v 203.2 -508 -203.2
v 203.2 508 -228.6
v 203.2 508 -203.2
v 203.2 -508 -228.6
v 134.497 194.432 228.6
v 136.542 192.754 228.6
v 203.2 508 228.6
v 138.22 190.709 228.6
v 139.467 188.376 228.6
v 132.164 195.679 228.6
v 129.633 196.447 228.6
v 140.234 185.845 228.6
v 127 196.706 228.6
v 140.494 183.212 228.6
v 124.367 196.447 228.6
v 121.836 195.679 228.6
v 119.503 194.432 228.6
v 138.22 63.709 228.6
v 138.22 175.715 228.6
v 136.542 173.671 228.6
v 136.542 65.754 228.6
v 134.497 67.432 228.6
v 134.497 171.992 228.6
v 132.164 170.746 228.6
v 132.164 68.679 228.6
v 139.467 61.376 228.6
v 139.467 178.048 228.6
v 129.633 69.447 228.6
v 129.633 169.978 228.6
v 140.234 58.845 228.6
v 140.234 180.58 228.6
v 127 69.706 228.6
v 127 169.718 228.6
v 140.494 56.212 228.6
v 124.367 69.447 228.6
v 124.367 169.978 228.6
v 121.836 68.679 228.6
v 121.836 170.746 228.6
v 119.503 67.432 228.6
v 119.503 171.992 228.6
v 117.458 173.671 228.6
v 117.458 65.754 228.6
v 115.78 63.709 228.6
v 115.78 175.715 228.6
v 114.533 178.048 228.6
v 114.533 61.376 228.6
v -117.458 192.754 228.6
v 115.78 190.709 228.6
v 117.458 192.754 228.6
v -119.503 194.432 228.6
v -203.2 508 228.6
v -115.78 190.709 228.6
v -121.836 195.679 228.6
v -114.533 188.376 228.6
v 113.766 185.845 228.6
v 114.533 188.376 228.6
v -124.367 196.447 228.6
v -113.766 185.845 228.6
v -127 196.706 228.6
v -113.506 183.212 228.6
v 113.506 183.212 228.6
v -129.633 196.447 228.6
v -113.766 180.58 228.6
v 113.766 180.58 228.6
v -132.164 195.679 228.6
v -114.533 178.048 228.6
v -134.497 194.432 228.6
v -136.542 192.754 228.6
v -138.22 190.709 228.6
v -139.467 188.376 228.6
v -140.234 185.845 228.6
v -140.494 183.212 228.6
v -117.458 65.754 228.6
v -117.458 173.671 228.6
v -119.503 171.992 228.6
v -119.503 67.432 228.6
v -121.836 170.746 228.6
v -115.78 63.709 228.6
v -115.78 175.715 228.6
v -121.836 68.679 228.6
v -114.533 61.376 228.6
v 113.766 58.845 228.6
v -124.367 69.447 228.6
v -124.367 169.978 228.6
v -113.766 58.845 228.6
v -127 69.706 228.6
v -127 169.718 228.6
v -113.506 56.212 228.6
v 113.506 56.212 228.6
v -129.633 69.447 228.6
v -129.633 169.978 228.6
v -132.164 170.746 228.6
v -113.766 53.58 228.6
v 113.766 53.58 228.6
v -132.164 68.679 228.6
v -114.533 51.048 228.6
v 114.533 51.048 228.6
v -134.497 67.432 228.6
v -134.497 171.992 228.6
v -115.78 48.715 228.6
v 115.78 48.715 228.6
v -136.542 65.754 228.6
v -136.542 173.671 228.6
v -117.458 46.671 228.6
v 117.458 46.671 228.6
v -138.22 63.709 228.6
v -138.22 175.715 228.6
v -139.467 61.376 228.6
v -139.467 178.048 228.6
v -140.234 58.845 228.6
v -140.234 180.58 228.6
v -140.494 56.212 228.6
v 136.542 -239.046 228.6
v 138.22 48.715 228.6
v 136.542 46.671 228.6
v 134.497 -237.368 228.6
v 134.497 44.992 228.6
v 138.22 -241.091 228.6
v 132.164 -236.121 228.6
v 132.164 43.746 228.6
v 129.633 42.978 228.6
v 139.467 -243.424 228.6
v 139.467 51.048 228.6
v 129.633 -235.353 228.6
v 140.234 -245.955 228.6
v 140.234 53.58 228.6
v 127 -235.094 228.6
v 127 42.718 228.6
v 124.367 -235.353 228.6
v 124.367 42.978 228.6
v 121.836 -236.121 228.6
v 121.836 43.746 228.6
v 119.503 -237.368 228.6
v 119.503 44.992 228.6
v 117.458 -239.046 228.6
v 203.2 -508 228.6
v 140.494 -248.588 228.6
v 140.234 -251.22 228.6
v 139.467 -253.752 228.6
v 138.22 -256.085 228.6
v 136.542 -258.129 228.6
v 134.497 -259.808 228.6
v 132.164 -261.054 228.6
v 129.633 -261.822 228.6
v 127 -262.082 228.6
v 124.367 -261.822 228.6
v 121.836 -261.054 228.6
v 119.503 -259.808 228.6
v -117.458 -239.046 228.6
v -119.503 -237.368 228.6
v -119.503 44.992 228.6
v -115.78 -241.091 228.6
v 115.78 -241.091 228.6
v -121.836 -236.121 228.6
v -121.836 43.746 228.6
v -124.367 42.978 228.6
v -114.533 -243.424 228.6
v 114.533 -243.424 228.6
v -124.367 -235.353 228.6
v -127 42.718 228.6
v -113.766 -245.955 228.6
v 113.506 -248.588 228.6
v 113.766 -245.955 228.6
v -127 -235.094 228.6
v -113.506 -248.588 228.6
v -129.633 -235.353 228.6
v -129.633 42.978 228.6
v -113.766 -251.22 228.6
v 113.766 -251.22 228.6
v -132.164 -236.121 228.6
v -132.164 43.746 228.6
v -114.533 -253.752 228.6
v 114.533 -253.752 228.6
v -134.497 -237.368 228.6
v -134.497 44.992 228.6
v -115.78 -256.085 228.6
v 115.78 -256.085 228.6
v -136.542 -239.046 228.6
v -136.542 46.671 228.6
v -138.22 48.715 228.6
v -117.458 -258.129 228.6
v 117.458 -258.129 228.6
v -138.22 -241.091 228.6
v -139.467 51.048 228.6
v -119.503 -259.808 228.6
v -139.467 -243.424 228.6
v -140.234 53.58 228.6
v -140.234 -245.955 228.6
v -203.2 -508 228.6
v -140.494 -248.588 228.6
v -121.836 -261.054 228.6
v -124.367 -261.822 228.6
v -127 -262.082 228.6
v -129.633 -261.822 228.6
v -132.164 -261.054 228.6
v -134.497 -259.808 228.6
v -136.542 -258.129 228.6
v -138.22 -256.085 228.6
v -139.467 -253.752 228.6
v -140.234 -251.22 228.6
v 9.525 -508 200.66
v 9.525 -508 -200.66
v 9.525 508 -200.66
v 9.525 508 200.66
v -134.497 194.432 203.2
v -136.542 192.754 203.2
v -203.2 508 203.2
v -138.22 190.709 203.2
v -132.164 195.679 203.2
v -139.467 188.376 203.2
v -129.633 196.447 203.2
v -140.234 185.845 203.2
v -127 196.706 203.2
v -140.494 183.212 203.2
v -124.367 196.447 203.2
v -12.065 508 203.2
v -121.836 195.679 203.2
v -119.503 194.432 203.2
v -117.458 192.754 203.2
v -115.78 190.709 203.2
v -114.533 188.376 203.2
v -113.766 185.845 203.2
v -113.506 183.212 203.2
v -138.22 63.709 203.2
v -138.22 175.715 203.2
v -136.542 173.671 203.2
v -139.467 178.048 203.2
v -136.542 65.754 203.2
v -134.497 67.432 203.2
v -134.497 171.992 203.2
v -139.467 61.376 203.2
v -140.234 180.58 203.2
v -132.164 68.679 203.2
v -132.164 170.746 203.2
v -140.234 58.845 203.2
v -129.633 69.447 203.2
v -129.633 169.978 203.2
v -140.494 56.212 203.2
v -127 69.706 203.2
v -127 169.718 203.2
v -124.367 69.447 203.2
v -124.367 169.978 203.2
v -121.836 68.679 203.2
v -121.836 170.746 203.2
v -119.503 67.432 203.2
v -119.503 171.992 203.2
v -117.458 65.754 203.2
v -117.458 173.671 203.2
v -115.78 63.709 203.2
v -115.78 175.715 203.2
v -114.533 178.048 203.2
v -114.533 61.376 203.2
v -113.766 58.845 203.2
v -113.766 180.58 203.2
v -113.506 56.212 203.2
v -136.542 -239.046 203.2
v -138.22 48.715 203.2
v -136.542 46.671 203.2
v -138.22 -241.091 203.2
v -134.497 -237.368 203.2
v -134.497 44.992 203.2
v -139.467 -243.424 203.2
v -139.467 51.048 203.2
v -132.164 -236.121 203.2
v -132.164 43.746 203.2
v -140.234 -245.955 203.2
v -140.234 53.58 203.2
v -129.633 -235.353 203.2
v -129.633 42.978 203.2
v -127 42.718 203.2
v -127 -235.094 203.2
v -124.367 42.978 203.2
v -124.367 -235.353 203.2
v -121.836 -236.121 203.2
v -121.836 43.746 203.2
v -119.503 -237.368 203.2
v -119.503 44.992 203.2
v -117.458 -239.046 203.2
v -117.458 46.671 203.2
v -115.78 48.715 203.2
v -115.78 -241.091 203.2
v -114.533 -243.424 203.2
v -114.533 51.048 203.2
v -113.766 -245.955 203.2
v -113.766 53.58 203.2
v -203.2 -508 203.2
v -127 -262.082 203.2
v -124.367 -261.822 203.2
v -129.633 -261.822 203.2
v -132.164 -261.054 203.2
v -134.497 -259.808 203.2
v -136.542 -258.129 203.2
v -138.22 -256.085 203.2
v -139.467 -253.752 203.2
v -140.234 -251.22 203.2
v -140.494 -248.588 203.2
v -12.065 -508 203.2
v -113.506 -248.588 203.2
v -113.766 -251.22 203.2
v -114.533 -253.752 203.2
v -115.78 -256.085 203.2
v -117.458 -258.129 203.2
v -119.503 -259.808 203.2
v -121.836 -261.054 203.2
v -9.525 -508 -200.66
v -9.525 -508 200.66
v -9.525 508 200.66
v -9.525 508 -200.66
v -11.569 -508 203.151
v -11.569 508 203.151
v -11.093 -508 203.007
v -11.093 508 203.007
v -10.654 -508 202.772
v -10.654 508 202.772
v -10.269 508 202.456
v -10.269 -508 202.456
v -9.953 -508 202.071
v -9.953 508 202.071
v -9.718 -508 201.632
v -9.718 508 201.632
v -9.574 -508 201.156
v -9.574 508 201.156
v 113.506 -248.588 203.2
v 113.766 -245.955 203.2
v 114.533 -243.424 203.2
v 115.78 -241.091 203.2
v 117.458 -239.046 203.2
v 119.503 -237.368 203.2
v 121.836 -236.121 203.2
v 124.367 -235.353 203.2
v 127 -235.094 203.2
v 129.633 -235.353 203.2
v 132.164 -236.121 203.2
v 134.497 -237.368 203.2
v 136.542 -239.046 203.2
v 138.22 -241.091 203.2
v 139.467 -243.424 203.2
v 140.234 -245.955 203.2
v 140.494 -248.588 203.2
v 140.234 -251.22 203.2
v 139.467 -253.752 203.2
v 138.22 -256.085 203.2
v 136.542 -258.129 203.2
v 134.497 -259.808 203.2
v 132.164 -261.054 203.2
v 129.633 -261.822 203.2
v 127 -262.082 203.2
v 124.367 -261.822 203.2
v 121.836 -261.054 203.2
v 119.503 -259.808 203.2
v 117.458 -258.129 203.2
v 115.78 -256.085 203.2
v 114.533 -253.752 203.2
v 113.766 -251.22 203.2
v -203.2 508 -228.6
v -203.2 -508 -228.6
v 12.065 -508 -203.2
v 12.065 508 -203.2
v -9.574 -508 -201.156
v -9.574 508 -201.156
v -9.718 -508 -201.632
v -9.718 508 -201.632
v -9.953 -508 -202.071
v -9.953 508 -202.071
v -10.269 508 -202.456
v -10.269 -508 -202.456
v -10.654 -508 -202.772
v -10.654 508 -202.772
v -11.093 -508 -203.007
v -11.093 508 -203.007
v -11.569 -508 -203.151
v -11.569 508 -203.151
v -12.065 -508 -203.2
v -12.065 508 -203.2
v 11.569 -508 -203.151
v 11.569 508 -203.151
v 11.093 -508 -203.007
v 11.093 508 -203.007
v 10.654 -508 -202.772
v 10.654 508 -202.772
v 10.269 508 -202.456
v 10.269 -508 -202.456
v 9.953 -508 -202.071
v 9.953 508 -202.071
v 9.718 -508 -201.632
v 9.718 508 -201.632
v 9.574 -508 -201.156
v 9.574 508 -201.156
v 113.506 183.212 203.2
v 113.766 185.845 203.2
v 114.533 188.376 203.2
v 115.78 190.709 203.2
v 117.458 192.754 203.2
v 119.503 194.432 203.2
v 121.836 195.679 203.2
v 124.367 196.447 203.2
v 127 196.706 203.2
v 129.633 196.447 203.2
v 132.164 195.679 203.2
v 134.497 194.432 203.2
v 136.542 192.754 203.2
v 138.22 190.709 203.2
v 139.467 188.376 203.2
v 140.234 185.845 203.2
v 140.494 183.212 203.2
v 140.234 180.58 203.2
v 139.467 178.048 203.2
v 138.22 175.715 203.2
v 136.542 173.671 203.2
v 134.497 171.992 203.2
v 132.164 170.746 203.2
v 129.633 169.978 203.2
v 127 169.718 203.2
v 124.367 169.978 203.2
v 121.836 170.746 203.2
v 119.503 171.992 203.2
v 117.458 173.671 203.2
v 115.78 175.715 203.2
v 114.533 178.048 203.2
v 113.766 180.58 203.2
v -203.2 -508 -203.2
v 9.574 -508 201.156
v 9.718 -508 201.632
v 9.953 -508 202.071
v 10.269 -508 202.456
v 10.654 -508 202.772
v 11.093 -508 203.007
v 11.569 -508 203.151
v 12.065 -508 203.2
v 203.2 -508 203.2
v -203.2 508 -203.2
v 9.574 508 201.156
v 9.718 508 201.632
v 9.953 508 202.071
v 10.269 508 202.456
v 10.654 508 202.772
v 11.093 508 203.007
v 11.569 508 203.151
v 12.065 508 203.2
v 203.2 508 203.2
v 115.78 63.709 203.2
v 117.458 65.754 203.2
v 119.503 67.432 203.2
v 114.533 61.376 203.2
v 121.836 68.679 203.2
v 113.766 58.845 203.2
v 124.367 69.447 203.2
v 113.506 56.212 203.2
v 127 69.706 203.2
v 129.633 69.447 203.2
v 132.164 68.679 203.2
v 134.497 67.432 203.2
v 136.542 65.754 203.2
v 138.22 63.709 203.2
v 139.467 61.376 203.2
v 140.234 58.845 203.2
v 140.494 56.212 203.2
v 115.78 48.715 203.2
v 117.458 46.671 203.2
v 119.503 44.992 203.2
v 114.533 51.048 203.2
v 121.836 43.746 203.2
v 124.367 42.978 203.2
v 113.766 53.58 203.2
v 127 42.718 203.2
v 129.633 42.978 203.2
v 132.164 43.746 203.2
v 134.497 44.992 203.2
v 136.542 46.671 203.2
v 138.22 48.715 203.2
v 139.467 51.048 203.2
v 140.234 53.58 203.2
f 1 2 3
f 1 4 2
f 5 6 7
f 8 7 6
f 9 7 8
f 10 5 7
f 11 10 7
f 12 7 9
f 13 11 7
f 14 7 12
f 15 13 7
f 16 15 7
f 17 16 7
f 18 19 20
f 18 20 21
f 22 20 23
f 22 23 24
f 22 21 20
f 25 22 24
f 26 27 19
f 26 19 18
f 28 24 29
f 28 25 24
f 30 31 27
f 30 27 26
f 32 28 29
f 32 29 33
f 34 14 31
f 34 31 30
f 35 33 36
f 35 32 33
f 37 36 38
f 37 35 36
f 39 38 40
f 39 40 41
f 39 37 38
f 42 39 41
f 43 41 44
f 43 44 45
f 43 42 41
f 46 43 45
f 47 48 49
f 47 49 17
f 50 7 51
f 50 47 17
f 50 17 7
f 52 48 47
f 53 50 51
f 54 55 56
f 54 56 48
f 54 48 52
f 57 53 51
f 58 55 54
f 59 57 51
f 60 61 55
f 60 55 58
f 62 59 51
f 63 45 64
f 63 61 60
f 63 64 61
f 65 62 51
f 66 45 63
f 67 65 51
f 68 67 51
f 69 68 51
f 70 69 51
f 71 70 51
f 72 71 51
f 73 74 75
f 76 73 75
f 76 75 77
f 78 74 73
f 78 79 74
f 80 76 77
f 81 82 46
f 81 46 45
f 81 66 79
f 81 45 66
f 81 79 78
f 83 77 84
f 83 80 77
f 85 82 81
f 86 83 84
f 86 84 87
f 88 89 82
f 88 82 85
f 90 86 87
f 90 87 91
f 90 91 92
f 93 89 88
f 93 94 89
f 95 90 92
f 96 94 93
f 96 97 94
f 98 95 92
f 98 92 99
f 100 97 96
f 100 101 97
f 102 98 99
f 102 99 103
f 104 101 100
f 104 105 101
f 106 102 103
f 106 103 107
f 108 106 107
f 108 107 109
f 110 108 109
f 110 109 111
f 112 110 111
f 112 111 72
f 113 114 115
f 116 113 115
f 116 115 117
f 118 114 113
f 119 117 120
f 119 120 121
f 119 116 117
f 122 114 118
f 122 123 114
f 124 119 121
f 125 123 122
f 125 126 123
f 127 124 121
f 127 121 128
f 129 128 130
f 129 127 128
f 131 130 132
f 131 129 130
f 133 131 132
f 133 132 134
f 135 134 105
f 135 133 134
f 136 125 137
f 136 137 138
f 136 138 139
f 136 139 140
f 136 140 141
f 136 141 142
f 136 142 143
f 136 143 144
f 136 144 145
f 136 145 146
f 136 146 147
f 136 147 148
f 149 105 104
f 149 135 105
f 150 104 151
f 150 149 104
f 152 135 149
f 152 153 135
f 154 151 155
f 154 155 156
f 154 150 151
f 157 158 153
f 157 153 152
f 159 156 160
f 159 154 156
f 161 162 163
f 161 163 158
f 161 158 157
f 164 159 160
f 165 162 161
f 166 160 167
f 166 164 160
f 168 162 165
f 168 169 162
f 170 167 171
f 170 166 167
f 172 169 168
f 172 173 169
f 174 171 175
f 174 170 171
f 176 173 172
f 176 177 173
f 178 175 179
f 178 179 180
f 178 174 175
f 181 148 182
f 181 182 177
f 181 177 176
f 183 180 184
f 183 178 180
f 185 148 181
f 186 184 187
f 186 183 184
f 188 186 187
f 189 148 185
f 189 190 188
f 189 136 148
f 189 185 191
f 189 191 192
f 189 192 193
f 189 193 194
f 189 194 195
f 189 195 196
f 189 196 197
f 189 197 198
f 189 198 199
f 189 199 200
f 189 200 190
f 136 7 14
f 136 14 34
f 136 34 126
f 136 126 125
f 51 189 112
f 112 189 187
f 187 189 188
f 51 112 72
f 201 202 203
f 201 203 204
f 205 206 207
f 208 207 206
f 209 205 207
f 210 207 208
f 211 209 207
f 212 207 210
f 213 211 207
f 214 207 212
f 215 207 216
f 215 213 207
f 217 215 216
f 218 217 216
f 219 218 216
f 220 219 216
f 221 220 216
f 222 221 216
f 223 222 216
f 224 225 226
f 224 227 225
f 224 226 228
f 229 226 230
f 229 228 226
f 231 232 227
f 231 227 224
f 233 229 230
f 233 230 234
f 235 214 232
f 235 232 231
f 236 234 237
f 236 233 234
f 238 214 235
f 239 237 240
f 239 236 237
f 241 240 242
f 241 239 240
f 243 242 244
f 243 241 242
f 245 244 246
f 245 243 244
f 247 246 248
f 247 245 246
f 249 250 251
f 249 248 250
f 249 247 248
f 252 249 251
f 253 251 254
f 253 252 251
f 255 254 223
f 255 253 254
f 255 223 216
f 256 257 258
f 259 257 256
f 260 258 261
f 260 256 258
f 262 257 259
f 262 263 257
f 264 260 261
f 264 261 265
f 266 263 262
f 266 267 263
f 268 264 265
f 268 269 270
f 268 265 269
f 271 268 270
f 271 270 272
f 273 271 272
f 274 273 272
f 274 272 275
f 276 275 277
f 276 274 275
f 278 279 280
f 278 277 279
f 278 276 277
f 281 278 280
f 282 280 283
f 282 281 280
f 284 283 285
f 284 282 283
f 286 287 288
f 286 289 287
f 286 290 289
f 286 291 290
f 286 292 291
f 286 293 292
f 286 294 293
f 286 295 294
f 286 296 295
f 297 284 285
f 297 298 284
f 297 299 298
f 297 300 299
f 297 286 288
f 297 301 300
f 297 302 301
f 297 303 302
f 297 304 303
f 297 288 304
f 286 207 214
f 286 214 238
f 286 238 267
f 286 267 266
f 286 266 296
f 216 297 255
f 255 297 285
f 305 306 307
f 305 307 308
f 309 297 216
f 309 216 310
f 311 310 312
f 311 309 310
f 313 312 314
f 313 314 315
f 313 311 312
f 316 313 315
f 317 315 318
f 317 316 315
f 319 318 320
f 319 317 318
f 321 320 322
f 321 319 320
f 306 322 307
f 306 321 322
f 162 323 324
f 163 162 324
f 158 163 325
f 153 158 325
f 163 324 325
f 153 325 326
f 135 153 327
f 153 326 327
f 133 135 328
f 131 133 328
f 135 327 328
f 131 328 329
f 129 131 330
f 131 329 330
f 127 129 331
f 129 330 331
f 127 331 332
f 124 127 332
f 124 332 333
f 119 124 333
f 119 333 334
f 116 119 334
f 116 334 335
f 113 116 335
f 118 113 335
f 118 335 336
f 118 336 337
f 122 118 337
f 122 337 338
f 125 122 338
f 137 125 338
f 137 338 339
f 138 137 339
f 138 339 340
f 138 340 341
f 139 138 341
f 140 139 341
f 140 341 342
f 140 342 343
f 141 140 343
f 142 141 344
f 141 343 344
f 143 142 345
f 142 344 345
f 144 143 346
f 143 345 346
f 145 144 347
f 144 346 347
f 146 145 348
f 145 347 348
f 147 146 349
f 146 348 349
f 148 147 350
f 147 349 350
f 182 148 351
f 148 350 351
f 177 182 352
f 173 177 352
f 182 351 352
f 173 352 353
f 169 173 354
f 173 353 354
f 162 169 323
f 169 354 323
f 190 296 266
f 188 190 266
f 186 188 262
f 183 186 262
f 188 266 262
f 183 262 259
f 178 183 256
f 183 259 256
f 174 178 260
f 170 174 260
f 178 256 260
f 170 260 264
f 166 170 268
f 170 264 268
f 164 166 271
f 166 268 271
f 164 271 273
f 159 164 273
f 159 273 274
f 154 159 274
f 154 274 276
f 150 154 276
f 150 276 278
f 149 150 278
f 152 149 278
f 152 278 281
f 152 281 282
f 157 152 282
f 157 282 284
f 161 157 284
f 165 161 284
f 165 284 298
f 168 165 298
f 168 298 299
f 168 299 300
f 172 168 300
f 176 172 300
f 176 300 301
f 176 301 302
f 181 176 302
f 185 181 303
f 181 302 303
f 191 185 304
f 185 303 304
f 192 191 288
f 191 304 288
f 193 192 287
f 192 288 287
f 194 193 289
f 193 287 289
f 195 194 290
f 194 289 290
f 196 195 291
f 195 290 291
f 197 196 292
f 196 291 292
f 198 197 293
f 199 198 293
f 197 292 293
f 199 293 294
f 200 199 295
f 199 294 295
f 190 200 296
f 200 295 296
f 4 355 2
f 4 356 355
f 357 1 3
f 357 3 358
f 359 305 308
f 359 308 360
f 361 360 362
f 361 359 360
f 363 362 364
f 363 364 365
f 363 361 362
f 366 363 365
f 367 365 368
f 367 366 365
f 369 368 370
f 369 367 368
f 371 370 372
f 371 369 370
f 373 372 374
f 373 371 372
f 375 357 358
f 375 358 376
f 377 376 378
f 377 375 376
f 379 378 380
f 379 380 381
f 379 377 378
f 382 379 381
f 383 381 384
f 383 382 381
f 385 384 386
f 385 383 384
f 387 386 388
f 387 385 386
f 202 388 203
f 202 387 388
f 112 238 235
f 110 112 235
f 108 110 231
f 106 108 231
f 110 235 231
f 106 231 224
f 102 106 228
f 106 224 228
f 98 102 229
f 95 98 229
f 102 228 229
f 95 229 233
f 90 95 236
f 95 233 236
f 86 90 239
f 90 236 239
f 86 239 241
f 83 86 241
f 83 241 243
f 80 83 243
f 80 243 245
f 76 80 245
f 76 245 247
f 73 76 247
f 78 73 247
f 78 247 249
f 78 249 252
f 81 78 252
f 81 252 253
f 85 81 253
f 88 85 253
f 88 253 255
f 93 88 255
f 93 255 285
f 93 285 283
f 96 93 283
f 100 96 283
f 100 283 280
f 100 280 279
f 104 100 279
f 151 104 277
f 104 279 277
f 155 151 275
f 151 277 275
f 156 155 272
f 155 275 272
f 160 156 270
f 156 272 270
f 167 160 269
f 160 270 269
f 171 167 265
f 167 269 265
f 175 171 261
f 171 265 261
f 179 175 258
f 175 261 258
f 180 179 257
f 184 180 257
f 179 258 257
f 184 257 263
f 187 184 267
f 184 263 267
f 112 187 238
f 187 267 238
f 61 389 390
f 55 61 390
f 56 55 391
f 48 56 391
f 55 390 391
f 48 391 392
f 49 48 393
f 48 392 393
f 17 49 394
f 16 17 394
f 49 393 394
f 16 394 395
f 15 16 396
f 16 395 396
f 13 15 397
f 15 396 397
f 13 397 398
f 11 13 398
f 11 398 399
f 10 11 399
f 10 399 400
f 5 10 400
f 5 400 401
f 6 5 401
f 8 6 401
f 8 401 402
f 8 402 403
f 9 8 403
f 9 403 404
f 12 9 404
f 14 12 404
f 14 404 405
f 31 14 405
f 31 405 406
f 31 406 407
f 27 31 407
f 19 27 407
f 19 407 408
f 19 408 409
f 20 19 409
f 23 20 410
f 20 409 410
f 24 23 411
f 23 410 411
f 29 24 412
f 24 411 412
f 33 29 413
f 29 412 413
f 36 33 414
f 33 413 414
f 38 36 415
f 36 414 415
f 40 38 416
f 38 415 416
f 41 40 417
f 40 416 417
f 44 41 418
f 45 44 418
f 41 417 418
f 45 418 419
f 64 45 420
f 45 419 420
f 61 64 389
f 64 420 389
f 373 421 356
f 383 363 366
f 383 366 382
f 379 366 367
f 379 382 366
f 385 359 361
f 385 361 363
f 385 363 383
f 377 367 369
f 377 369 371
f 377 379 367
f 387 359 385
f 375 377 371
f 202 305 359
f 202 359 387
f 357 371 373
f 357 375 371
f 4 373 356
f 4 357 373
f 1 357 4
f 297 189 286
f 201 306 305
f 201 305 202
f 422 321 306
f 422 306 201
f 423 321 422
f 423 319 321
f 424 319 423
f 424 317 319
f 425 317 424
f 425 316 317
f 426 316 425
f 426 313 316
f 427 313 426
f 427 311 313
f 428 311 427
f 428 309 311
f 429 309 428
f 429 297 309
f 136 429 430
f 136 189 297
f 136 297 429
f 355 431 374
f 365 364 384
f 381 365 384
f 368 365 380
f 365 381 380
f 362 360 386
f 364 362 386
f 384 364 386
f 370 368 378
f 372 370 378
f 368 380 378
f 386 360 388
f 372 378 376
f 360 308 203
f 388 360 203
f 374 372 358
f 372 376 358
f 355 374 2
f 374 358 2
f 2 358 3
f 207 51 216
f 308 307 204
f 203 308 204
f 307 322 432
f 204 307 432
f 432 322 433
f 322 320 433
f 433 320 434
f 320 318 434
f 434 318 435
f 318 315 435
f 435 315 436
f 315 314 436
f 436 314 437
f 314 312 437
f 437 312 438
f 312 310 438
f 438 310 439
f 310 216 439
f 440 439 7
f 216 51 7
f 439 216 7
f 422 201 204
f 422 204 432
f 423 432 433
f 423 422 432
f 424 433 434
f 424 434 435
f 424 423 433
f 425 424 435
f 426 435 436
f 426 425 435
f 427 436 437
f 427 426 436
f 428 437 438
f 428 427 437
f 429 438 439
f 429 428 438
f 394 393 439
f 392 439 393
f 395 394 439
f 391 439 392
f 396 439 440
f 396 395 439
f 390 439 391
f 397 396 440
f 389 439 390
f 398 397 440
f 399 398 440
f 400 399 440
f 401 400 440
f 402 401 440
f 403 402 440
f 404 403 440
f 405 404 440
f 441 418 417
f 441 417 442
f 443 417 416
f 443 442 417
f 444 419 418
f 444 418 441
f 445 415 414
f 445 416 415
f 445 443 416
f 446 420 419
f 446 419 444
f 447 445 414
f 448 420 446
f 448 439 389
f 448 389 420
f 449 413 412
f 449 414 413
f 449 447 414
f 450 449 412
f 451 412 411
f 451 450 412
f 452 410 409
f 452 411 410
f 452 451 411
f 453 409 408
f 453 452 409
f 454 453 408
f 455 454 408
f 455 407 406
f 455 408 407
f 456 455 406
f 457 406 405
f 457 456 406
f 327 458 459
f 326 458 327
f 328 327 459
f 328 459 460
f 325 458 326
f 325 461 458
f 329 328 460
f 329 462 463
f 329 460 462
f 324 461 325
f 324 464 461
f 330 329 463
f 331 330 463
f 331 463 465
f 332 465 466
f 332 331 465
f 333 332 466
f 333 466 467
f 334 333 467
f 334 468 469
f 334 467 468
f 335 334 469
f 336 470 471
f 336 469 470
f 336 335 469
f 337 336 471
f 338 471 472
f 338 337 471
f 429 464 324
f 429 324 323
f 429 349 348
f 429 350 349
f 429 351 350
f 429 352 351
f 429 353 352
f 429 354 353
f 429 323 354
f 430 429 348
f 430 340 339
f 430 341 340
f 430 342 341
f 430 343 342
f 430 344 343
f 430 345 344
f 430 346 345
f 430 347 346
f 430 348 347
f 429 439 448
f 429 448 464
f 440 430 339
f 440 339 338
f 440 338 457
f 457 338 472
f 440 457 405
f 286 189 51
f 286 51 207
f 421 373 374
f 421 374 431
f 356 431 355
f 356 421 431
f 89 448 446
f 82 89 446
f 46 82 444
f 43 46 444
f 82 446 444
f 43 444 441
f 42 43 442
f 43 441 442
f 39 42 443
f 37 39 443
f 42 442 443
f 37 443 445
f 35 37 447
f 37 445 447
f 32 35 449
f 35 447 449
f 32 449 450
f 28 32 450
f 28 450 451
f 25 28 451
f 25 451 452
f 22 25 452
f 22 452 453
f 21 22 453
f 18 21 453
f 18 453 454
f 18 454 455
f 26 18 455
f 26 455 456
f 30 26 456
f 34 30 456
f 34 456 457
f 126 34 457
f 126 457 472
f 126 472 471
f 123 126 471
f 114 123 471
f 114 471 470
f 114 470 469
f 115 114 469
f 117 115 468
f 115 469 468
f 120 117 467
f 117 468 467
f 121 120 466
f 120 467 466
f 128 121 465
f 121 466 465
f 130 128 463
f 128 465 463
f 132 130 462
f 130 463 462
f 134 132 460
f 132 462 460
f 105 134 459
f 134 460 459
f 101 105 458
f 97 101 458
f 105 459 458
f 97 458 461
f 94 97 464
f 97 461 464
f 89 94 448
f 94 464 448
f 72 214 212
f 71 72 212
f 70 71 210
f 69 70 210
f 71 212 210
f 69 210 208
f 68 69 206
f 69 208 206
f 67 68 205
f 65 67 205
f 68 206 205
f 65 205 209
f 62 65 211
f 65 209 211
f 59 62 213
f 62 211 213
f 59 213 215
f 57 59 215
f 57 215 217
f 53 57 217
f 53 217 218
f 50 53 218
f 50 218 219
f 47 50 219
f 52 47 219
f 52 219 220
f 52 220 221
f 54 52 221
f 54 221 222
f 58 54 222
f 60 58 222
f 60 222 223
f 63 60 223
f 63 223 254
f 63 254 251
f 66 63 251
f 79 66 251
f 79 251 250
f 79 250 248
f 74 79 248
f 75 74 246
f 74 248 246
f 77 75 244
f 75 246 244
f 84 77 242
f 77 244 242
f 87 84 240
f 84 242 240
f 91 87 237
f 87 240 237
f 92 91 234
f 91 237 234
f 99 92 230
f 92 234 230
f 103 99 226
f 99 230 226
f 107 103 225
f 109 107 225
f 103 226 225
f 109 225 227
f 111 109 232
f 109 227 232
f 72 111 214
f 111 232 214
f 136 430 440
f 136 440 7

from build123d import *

# Parameters (mm, degrees)
F1_DEPTH = 508
F3_D     = 26.9875
F3_DEPTH = 25.4


with BuildPart() as f1:
    # F0 (on Front) → F1 (new body, symmetric)
    with BuildSketch(Plane.XZ):
        with BuildLine():
            Line((203.2, -228.6), (203.2, -203.2))
            Line((203.2, -203.2), (12.065, -203.2))
            ThreePointArc((12.065, -203.2), (10.268949, -202.456051), (9.525, -200.66))
            Line((9.525, -200.66), (9.525, 200.66))
            ThreePointArc((9.525, 200.66), (10.268949, 202.456051), (12.065, 203.2))
            Line((12.065, 203.2), (203.2, 203.2))
            Line((203.2, 203.2), (203.2, 228.6))
            Line((203.2, 228.6), (-203.2, 228.6))
            Line((-203.2, 228.6), (-203.2, 203.2))
            Line((-203.2, 203.2), (-12.065, 203.2))
            ThreePointArc((-12.065, 203.2), (-10.268949, 202.456051), (-9.525, 200.66))
            Line((-9.525, 200.66), (-9.525, -200.66))
            ThreePointArc((-9.525, -200.66), (-10.268949, -202.456051), (-12.065, -203.2))
            Line((-12.065, -203.2), (-203.2, -203.2))
            Line((-203.2, -203.2), (-203.2, -228.6))
            Line((-203.2, -228.6), (203.2, -228.6))
        make_face()
    extrude(amount=F1_DEPTH, both=True)

    # F3
    with Locations(Plane.XY.offset(228.6)):
        with Locations((-127, 183.212104), (-127, 56.212104), (-127, -248.587896), (127, -248.587896), (127, 56.212104), (127, 183.212104)):
            Hole(F3_D / 2, depth=F3_DEPTH)


solid = f1.part
